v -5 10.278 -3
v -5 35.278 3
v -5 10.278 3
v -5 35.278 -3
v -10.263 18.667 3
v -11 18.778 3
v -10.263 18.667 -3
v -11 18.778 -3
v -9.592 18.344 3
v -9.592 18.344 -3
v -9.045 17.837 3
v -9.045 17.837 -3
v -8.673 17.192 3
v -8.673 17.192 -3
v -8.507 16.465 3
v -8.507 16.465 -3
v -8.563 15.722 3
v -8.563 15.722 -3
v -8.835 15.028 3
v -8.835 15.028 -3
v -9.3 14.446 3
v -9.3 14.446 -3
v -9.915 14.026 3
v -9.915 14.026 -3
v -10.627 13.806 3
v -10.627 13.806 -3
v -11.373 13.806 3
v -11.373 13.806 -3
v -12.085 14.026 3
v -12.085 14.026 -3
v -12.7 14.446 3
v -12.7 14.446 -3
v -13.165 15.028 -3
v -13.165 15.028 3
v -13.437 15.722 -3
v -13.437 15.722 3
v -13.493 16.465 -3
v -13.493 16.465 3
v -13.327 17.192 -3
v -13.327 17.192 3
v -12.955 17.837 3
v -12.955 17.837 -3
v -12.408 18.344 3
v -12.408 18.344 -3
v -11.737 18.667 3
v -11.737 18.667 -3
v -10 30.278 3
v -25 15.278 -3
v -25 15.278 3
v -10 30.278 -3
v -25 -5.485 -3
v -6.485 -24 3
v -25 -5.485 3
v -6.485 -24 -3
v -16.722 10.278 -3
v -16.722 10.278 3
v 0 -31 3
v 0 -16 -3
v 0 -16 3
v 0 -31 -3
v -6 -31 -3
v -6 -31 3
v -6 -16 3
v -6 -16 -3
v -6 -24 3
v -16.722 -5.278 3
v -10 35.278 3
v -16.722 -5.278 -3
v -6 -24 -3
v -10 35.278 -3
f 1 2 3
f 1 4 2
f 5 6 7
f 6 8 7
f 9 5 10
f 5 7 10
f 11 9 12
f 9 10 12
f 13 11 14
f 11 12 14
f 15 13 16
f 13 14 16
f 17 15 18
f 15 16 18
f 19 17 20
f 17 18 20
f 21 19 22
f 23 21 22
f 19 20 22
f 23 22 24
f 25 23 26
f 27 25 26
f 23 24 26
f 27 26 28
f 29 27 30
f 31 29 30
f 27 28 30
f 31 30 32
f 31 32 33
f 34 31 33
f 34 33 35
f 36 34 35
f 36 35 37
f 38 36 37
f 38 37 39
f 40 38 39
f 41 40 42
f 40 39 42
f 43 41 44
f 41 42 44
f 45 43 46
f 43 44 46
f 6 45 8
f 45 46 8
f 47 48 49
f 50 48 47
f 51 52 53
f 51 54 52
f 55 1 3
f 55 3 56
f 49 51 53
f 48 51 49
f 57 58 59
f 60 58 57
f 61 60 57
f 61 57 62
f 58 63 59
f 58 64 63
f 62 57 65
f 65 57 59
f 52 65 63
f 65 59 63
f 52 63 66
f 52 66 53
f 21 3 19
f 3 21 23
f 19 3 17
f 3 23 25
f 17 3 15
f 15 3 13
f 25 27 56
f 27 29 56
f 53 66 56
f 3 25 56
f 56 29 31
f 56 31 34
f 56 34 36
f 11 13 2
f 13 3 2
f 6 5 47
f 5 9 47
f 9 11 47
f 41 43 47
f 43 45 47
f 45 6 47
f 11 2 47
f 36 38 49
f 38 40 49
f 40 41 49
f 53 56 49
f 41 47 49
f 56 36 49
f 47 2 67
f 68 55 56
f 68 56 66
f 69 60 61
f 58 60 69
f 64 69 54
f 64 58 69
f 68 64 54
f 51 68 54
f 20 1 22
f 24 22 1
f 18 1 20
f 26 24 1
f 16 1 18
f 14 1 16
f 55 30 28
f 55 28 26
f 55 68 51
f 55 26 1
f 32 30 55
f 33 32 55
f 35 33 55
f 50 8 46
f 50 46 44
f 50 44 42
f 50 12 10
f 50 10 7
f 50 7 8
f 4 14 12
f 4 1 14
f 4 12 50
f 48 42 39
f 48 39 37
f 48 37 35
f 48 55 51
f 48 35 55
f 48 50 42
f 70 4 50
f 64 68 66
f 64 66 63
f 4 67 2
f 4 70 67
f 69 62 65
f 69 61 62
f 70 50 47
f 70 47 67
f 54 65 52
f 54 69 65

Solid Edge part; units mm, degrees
sketch "Sketch1" plane through (0, 0, 0) normal (0, 0, 1) x (1, 0, 0)
  line L0 (0, 24) -> (0, 16)
  line L1 (0, 16) -> (-6, 16)
  line L2 (-6, 16) -> (-16.7217, 5.2783)
  line L3 (-16.7217, 5.2783) -> (-16.7217, -5.2783)
  line L4 (-16.7217, -5.2783) -> (-6, -16)
  line L5 (-6, -16) -> (0, -16)
  line L6 (0, -16) -> (0, -24)
  line L7 (0, -24) -> (-6.4853, -24)
  line L8 (-6.4853, -24) -> (-25, -5.4853)
  line L9 (-25, -5.4853) -> (-25, 5.4853)
  line L10 (-25, 5.4853) -> (-6.4853, 24)
  line L11 (-6.4853, 24) -> (0, 24)
  dimension "D1" = 6
  dimension "D2" = 6
  dimension "D3" = 8
  dimension "D4" = 25
  dimension "D5" = 32
extrude "Protrusion1" add sketch "Sketch1" along normal mid plane 6
sketch "Sketch2" plane through (0, 0, 0) normal (0, 0, 1) x (1, 0, 0)
  line L0 (-6, -16) -> (0, -16)
  line L1 (0, -16) -> (0, -31)
  line L2 (0, -31) -> (-6, -31)
  line L3 (-6, -31) -> (-6, -16)
  dimension "D1" = 15
extrude "ExtrudedProtrusion_2" add sketch "Sketch2" along normal mid plane 6
sketch "Sketch3" plane through (-12.2288, -3.5, -3) normal (0, 0, -1) x (0, 1, 0)
  line L0 (8.7783, -4.4929) -> (8.7783, -12.7712)
  line L1 (8.7783, -12.7712) -> (8.9853, -12.7712)
  line L2 (8.9853, -12.7712) -> (27.5, 5.7435)
  line L3 (27.5, 5.7435) -> (27.5, 12.2288)
  line L4 (27.5, 12.2288) -> (19.5, 12.2288)
  line L5 (19.5, 12.2288) -> (19.5, 6.2288)
  line L6 (19.5, 6.2288) -> (8.7783, -4.4929)
extrude "Cutout1" cut sketch "Sketch3" against normal through all
sketch "Sketch4" plane through (0, 0, 0) normal (0, 0, 1) x (1, 0, 0)
  line L0 (-16.7217, 5.2783) -> (-25, 5.2783)
  line L1 (-25, 5.2783) -> (-25, 15.2783)
  line L2 (-25, 15.2783) -> (-10, 30.2783)
  line L3 (-10, 30.2783) -> (-10, 35.2783)
  line L4 (-10, 35.2783) -> (-5, 35.2783)
  line L5 (-5, 35.2783) -> (-5, 10.2783)
  line L6 (-5, 10.2783) -> (-16.7217, 10.2783)
  line L7 (-16.7217, 10.2783) -> (-16.7217, 5.2783)
  dimension "D1" = 30
  dimension "D2" = 5
  dimension "D3" = 10
  dimension "D4" = 20
  dimension "D5" = 5
extrude "ExtrudedProtrusion_3" add sketch "Sketch4" along normal mid plane 6
hole "Hole_1" at (-11, 16.2783, -3) direction (0, 0, 1) diameter 5 end up to next
properties material "Polyethylene, low density"
